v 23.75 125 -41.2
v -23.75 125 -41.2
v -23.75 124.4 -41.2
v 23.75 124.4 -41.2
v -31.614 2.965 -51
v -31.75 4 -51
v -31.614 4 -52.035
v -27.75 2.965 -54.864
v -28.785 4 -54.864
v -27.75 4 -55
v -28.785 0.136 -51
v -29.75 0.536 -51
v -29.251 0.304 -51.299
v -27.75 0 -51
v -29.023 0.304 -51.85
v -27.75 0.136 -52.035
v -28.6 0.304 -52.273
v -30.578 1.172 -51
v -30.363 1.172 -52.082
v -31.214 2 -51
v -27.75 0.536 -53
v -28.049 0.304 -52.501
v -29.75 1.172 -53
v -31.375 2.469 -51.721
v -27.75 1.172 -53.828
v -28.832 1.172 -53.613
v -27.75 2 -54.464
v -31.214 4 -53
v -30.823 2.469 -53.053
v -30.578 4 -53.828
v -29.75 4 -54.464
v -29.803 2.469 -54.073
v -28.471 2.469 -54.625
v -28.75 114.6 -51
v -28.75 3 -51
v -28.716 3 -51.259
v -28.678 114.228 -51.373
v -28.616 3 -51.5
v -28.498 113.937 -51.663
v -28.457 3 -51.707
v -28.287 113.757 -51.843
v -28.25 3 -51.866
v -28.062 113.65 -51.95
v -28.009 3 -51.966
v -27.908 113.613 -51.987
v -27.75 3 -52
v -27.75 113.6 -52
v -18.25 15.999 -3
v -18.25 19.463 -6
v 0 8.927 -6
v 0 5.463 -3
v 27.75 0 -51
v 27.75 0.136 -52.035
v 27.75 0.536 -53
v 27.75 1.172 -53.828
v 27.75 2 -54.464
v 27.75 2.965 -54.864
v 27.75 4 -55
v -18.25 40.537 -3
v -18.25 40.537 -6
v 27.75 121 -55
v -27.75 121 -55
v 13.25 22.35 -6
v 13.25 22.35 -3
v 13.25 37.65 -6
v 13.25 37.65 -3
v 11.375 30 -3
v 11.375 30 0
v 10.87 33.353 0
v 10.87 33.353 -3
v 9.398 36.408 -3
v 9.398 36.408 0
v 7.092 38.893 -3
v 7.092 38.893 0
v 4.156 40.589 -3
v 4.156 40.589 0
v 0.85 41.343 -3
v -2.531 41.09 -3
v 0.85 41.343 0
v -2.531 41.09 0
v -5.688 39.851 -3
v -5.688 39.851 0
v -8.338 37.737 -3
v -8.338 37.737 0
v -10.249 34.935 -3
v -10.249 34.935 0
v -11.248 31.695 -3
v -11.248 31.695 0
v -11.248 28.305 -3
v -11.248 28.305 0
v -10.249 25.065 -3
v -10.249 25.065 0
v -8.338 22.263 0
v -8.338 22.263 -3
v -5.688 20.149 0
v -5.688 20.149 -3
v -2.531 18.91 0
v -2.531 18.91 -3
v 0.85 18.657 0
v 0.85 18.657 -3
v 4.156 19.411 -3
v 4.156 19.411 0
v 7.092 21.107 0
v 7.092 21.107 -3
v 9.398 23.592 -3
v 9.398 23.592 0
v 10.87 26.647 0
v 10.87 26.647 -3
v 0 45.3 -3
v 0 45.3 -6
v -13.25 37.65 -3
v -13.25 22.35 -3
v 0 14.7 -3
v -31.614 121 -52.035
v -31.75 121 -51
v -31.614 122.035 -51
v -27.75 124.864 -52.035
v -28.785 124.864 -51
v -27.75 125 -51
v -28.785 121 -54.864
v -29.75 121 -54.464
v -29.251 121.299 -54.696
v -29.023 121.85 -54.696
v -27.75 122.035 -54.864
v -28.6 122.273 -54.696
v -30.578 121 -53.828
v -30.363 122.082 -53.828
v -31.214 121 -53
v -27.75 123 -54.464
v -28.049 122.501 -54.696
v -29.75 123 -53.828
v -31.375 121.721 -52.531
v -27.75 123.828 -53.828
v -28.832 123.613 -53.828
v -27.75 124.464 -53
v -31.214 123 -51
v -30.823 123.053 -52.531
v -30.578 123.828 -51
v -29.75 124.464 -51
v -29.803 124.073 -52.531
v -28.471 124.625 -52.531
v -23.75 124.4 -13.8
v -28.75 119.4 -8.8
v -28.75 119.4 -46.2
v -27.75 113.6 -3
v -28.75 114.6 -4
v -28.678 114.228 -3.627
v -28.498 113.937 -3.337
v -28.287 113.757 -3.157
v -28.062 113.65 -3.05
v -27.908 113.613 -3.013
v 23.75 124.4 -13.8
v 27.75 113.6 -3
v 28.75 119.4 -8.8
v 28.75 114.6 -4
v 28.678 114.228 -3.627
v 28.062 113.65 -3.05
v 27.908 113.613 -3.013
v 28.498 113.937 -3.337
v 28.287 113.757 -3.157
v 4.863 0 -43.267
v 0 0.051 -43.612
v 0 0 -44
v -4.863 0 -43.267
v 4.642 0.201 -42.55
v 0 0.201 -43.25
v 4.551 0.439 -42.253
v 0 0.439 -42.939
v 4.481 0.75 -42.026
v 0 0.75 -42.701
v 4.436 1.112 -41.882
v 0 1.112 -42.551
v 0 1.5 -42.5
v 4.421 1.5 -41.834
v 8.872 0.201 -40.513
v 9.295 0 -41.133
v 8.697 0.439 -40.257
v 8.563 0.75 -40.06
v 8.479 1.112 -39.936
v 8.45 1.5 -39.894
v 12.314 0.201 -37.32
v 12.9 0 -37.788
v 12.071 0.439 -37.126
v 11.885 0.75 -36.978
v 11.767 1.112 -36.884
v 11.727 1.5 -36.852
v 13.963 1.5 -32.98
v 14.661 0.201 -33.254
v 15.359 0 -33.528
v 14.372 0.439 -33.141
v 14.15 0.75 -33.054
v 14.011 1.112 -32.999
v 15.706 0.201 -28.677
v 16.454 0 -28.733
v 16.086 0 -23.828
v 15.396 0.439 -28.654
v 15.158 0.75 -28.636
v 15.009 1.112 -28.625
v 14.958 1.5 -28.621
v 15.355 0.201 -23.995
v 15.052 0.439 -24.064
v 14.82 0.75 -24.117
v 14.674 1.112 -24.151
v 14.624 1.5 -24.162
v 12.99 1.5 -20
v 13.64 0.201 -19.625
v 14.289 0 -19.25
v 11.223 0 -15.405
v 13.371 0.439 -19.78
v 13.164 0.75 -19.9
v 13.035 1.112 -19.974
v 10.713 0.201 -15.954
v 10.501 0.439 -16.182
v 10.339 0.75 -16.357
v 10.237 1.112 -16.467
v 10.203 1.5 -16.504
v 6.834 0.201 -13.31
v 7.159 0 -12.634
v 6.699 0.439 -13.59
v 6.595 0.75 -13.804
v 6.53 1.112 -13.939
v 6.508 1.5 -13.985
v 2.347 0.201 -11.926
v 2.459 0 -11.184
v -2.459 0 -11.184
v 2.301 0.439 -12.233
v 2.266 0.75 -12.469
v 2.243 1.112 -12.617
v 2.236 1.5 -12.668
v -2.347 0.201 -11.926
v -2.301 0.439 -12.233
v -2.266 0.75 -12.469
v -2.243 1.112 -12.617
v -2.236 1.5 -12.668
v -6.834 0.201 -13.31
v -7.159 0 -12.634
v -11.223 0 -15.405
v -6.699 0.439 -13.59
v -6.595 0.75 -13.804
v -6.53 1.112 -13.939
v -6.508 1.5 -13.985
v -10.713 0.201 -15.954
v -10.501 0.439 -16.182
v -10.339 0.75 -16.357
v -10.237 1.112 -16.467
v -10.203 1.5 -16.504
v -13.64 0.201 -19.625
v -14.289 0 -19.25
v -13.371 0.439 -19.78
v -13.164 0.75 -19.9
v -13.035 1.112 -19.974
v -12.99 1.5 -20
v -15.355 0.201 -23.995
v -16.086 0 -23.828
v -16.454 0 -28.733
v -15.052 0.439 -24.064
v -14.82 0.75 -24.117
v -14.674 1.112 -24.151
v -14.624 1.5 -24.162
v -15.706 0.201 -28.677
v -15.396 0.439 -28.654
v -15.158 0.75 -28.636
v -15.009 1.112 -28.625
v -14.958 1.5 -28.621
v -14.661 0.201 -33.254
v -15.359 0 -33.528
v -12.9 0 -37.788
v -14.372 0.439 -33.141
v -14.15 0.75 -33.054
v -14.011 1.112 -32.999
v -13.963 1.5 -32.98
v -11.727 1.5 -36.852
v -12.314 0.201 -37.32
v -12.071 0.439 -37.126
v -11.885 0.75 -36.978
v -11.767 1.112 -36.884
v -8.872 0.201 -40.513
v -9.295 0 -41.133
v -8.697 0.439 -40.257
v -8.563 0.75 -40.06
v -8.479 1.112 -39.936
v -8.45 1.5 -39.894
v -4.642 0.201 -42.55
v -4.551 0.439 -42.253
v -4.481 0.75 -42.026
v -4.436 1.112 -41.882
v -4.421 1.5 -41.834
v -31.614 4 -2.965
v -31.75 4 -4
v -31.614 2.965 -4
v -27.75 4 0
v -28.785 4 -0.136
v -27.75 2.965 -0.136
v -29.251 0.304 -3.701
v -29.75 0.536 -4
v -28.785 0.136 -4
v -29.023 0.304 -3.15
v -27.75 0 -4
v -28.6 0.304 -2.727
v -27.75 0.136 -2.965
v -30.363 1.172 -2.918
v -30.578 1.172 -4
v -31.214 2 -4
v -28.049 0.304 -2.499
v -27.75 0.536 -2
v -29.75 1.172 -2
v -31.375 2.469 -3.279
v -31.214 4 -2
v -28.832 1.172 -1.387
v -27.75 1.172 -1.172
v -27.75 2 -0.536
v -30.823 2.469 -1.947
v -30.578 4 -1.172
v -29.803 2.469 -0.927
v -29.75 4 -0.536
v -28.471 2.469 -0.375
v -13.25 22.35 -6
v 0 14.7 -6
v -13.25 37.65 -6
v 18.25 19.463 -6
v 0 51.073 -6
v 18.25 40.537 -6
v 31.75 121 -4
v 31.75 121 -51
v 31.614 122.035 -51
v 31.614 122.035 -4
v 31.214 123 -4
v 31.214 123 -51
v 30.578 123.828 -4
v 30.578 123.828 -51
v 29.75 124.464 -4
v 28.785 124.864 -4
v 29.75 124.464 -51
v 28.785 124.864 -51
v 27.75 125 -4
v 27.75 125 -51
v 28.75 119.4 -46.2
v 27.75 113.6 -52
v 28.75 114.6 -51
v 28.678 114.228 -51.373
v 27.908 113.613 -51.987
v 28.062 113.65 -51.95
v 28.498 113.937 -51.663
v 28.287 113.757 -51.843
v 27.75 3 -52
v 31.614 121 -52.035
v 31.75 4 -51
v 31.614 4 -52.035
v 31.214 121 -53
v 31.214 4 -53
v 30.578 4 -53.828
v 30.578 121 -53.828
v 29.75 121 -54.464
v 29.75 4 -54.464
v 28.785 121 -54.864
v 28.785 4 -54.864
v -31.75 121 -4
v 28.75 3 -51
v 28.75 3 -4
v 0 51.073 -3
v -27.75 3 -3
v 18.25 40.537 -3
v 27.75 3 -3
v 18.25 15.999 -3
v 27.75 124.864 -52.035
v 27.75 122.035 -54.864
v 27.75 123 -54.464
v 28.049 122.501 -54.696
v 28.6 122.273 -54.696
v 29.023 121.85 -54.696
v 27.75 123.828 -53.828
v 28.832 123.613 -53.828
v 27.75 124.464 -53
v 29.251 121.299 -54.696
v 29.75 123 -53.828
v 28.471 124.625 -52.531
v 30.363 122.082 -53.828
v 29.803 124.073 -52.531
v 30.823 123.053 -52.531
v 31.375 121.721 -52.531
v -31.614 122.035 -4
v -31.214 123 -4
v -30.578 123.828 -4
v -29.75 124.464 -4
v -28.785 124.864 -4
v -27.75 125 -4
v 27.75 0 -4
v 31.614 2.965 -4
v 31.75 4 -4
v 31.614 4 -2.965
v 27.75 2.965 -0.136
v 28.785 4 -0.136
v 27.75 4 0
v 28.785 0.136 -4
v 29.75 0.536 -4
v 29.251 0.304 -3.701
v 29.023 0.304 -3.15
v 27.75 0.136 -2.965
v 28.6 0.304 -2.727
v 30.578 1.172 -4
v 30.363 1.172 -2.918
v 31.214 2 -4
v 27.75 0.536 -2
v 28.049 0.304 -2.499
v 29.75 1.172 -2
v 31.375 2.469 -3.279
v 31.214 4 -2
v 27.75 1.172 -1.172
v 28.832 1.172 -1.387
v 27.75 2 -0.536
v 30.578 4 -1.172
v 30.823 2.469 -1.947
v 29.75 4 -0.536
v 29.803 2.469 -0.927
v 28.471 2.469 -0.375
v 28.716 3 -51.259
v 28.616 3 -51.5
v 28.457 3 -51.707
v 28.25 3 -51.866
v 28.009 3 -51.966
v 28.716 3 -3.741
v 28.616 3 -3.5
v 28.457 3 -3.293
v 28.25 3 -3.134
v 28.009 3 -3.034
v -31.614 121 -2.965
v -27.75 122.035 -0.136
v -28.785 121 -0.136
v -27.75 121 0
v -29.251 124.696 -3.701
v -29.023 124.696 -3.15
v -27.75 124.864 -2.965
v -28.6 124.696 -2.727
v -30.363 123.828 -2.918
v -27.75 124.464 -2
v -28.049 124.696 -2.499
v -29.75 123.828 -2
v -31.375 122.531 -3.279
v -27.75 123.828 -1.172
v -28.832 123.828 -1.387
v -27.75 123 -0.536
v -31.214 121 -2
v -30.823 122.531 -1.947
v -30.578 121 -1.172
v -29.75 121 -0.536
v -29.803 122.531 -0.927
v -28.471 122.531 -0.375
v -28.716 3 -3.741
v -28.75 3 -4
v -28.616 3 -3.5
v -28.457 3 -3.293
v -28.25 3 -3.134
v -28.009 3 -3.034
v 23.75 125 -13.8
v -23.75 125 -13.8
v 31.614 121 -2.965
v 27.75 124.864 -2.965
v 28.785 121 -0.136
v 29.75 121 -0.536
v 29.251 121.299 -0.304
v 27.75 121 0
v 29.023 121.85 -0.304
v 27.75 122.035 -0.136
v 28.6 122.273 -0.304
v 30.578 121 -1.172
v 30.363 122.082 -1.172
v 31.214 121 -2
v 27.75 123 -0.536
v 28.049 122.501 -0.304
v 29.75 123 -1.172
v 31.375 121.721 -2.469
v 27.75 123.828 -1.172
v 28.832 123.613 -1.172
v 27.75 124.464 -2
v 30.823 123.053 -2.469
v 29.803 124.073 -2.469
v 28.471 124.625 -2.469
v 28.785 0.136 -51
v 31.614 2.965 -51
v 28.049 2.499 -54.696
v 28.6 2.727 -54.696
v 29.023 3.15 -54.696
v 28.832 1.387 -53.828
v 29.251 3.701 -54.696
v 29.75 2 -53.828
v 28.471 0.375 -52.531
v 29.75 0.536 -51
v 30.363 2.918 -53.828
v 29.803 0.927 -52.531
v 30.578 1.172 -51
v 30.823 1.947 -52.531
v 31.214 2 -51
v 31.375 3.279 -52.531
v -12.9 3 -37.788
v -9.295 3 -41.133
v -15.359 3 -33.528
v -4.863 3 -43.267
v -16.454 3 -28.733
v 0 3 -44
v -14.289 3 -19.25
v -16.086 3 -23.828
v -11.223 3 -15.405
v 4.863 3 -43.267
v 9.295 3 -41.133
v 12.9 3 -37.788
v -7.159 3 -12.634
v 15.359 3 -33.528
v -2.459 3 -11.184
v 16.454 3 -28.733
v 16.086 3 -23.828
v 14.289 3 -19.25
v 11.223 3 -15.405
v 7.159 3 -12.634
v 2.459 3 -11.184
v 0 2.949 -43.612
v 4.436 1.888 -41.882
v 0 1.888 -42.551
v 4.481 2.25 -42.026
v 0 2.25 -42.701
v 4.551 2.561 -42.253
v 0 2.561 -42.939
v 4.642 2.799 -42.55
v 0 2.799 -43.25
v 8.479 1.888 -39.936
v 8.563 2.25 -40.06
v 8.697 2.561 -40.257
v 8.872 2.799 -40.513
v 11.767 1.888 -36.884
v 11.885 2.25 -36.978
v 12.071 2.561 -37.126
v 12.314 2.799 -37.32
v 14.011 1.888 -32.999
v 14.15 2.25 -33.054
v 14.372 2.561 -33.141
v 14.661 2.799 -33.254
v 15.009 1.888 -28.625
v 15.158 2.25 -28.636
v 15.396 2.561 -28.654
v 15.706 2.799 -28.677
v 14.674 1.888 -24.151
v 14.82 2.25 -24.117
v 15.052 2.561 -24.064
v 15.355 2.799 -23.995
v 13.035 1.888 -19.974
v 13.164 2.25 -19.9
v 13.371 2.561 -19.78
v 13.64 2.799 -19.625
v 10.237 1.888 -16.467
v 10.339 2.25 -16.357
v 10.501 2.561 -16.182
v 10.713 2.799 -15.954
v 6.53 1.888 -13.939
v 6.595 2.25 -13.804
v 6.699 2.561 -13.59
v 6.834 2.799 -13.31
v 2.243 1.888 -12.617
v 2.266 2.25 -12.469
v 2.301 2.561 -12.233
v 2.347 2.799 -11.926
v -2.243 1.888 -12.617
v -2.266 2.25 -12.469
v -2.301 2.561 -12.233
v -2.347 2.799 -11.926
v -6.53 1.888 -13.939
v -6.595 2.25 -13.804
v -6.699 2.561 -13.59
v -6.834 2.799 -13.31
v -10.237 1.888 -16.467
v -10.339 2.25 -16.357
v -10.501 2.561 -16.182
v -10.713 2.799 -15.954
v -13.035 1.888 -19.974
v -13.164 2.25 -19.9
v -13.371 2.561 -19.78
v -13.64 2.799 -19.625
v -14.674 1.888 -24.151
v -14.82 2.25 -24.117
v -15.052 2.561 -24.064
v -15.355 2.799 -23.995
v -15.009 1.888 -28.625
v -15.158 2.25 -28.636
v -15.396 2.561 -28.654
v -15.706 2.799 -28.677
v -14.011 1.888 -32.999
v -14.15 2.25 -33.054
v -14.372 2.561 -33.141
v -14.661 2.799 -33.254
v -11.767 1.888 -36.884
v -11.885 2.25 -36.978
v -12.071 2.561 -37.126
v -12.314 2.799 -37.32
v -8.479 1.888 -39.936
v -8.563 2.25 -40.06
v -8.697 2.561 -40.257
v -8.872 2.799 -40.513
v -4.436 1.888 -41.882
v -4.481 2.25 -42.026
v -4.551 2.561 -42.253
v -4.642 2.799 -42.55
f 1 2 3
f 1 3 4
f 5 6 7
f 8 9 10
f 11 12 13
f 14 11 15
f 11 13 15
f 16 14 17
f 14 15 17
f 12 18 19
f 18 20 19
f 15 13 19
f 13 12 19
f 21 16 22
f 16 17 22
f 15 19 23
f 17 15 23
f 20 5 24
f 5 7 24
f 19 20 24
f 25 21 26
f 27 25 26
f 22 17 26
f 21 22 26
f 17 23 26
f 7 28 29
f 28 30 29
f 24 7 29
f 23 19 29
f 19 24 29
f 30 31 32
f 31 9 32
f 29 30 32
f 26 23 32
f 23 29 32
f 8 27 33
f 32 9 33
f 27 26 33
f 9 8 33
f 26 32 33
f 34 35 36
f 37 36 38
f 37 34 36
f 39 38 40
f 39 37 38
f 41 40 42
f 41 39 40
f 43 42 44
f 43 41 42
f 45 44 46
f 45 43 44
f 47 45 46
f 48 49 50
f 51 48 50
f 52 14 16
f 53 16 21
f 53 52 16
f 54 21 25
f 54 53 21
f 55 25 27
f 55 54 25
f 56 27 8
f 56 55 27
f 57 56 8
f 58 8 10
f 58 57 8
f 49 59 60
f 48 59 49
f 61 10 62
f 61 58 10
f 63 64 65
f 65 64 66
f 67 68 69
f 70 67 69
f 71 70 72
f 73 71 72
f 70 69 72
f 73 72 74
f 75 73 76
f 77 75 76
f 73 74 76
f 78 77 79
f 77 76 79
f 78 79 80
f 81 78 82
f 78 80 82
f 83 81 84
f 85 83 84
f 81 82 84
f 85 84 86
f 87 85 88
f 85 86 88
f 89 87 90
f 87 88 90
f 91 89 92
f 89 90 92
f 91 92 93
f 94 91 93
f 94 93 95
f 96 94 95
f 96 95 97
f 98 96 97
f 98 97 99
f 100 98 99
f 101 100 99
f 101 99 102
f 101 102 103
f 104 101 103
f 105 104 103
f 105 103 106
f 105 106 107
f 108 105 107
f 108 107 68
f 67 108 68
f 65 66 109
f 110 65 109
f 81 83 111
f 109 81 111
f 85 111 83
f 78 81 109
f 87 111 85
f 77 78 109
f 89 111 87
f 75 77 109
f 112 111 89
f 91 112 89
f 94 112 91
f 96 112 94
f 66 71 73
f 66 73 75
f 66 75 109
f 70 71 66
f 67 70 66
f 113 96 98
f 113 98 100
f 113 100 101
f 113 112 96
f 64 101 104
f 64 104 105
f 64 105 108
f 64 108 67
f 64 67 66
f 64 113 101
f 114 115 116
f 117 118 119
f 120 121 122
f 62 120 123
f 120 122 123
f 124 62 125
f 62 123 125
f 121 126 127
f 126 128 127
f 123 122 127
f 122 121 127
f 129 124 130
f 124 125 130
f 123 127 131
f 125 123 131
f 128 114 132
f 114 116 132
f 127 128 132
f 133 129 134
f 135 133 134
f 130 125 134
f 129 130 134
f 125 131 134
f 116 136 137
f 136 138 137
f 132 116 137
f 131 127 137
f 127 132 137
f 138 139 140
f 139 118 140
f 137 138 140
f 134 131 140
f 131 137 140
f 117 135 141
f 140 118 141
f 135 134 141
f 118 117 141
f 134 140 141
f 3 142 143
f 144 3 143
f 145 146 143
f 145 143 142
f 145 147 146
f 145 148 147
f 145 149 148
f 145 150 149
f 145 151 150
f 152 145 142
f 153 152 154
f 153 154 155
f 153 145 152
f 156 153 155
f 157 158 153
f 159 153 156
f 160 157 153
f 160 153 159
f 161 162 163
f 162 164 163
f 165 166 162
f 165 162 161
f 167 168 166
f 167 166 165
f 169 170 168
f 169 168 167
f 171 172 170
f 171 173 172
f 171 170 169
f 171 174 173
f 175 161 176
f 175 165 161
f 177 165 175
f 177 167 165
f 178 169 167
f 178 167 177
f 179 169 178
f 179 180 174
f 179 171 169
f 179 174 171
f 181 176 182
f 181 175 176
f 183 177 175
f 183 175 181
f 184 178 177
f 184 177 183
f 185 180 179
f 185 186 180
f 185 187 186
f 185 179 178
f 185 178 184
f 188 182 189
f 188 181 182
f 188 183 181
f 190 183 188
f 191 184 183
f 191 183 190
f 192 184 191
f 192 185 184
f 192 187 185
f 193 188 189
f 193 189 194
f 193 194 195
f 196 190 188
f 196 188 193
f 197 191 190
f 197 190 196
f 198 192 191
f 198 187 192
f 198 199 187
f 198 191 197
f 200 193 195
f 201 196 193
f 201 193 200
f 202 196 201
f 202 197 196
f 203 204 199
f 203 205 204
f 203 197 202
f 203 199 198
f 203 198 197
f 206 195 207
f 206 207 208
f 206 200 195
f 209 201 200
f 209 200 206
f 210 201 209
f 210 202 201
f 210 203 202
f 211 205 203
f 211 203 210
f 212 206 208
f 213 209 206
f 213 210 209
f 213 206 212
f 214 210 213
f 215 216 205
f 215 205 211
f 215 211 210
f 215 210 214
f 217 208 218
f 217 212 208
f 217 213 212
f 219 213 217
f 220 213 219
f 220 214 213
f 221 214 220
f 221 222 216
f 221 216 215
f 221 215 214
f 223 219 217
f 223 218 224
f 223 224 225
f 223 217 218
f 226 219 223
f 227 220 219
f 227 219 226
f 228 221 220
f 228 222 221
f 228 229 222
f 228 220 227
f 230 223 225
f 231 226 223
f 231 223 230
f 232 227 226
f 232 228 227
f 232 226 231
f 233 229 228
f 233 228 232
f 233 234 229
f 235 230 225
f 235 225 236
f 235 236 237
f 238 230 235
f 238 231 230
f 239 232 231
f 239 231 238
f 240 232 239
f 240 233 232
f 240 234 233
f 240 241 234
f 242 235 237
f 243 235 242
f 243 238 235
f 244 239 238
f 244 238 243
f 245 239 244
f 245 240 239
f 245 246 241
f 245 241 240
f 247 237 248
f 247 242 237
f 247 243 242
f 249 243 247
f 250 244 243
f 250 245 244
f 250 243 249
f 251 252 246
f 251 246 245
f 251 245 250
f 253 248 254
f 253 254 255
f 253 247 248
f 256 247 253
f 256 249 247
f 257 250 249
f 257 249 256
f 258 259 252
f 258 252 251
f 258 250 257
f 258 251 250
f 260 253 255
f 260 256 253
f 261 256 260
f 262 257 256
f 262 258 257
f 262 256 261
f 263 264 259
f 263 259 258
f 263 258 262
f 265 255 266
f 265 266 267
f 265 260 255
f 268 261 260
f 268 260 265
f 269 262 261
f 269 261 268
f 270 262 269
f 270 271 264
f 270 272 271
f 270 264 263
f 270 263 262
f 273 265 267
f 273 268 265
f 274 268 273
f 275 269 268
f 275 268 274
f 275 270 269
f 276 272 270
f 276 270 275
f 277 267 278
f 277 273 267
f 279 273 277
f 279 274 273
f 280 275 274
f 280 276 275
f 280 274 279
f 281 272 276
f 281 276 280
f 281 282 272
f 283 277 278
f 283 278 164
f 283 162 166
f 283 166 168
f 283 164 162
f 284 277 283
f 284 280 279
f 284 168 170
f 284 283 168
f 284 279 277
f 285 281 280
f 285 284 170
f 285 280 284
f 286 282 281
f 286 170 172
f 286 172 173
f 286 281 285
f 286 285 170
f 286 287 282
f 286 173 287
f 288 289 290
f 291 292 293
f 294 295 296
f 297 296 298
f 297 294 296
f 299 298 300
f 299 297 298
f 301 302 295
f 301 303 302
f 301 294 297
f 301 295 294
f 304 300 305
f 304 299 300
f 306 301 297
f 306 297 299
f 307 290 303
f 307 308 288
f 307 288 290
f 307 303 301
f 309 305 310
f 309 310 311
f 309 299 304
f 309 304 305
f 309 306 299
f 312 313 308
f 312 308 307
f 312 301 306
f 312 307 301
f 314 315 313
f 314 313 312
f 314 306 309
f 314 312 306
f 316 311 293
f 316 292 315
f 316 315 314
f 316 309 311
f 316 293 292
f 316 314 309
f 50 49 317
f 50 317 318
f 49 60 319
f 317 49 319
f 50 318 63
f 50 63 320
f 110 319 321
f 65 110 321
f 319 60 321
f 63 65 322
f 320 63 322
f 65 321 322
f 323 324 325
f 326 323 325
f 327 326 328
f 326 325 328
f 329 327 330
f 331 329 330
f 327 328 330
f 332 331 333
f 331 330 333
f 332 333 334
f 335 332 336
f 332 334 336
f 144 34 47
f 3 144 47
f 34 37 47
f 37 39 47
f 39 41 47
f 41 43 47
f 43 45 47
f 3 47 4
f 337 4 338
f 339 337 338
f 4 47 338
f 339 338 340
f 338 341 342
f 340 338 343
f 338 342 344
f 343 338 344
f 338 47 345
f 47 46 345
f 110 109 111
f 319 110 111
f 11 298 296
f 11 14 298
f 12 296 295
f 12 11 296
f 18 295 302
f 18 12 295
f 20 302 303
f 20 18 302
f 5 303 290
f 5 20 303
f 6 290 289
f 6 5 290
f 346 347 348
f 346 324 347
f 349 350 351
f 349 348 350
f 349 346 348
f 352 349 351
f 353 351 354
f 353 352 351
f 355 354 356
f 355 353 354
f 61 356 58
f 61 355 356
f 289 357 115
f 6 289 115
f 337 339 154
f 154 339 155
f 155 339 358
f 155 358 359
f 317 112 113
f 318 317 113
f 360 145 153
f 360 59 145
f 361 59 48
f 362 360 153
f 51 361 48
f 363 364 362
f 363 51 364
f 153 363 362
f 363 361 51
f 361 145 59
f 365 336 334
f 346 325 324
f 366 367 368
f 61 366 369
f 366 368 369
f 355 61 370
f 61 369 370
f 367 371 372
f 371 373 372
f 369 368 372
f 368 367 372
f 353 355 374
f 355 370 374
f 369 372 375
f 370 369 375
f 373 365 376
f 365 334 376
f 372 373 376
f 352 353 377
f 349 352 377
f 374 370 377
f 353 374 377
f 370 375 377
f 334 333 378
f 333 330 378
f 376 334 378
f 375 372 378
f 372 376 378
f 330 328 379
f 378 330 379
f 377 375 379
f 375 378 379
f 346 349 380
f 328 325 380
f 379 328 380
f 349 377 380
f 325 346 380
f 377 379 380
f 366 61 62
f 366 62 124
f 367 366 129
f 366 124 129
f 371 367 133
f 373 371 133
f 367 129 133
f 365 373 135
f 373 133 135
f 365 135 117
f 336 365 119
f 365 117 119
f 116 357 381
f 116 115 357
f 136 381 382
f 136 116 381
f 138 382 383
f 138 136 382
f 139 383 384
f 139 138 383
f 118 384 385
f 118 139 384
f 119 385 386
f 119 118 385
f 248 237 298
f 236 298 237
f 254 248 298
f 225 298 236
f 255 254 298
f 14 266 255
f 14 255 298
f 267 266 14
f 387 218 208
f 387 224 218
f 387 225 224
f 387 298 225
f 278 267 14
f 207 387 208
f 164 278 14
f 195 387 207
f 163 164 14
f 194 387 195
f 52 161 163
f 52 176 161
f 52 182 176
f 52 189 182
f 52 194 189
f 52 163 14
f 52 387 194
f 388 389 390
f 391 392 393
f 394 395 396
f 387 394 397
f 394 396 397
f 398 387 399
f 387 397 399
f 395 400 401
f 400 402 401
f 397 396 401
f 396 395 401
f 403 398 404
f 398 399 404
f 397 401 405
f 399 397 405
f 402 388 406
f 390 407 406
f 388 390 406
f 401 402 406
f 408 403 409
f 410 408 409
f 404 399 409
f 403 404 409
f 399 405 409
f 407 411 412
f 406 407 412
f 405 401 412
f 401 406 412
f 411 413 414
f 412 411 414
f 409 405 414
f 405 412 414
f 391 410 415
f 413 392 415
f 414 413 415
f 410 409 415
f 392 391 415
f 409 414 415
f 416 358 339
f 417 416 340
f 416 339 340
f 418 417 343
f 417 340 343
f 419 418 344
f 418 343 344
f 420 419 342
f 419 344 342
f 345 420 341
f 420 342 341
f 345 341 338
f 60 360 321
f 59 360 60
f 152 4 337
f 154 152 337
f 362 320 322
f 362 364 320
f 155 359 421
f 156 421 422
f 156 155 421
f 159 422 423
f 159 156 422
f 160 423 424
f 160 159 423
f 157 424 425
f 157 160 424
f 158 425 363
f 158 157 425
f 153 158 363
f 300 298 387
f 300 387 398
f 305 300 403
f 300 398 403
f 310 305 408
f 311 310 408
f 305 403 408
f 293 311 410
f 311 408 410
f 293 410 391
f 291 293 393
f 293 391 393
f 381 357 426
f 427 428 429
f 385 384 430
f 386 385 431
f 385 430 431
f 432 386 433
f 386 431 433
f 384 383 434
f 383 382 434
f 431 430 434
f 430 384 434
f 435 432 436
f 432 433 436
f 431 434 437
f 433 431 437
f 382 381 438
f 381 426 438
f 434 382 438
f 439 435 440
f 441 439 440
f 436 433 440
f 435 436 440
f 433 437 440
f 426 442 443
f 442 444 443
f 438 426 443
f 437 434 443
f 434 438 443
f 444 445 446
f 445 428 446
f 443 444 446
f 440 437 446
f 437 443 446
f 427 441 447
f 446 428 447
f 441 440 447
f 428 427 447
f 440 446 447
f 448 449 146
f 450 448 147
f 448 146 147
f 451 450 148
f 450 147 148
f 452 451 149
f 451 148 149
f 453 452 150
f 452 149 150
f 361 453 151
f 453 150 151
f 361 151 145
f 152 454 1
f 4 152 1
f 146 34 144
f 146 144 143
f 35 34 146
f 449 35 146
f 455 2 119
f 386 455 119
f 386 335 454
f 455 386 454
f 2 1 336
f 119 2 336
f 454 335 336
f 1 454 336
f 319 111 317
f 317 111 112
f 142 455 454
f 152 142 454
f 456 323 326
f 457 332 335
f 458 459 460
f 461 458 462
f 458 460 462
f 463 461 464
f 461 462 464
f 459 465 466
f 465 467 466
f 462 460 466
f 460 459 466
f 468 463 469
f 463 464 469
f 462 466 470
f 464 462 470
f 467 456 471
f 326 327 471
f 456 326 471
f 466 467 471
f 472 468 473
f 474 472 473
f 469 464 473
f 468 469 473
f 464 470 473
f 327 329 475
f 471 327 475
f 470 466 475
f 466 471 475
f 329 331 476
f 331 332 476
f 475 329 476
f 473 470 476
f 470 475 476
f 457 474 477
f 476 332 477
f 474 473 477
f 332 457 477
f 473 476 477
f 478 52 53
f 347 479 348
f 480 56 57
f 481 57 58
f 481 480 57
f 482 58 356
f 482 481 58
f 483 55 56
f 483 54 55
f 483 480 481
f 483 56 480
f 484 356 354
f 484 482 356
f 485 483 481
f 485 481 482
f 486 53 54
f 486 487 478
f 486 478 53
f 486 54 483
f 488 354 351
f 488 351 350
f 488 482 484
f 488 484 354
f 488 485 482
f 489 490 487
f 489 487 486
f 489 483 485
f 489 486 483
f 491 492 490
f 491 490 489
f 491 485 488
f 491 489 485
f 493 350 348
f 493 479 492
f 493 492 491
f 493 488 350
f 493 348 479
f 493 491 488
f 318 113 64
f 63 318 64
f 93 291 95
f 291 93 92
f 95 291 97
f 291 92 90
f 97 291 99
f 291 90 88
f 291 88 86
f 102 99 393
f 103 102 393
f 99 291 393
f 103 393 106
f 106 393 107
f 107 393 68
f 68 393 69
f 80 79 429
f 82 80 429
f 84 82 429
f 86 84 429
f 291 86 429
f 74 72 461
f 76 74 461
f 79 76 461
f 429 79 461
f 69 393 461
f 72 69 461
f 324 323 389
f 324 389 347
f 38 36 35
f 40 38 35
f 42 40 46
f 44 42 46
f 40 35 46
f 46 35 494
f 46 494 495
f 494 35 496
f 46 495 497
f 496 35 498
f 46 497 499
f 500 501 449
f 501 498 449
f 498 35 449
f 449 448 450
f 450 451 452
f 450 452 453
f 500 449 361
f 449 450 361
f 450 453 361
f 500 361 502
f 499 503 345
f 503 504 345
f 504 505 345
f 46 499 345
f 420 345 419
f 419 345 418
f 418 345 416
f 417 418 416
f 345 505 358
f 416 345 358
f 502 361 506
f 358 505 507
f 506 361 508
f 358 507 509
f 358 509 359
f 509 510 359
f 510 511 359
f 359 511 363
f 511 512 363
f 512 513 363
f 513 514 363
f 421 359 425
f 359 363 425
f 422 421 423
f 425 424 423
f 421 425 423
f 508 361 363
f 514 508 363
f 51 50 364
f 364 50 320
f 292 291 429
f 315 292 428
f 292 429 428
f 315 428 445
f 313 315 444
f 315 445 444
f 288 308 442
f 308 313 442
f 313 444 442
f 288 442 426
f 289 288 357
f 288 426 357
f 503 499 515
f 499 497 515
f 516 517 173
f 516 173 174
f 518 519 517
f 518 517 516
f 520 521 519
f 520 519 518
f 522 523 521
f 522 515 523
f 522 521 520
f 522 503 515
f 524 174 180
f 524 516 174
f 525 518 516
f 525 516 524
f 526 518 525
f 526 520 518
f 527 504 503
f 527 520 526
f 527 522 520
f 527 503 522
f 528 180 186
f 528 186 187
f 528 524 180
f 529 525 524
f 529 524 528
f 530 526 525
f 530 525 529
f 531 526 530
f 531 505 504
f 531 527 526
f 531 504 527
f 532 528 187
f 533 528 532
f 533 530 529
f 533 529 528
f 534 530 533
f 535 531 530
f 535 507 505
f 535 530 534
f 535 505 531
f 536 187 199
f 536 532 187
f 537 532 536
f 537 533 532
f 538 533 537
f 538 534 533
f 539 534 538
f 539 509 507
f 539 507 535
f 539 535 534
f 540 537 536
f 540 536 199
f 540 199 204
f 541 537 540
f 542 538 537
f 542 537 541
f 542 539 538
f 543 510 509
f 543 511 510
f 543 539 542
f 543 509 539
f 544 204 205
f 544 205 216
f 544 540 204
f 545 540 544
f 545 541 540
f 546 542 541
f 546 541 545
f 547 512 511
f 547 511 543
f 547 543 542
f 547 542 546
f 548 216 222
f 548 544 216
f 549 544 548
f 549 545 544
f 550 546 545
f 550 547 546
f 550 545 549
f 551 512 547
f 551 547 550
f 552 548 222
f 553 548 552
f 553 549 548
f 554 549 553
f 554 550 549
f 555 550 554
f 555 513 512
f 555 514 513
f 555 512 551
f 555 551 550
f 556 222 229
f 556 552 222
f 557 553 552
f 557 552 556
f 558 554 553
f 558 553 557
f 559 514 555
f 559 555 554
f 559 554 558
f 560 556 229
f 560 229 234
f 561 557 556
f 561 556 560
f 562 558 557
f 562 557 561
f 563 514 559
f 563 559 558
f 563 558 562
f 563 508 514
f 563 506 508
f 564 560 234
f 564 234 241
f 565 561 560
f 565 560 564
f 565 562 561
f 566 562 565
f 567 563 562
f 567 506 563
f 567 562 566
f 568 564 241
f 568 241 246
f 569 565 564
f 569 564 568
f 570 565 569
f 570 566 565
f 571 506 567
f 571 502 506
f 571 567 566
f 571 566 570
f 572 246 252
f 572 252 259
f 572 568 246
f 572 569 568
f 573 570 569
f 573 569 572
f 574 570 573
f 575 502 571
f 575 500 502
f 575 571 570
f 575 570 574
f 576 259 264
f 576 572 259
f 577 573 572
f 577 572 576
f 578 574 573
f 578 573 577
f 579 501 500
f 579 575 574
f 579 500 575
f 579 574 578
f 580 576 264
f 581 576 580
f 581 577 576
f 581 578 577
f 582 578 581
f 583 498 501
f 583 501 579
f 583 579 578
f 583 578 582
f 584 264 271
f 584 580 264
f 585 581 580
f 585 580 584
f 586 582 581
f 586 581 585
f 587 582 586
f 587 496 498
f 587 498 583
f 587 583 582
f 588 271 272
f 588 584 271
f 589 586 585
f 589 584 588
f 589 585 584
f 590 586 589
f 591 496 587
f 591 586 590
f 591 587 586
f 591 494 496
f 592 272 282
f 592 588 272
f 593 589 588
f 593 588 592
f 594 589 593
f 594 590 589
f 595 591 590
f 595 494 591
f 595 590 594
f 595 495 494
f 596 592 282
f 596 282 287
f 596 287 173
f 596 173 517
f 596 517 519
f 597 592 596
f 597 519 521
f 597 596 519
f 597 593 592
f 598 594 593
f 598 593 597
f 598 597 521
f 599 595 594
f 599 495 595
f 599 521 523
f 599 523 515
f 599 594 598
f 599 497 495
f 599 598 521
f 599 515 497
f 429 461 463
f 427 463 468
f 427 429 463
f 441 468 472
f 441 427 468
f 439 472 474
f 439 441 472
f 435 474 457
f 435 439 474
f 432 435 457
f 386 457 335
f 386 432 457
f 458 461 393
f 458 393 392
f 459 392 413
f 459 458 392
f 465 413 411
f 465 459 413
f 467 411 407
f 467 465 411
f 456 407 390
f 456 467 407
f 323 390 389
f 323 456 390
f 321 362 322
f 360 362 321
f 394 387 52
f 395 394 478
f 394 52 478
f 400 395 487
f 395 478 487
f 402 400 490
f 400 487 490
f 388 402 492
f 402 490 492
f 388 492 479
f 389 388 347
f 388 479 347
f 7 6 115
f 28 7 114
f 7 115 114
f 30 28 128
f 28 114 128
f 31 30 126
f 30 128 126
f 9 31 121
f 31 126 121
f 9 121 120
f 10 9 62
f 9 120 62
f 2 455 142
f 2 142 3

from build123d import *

# Parameters (mm, degrees)
PROFILE_SKETCH_W                         = 55
PROFILE_SKETCH_H                         = 125
PROFILE_EXTRUDE_DEPTH                    = 31.75
INTERIOR_START                           = -3
INTERIOR_SKETCH_W                        = 57.5
INTERIOR_SKETCH_H                        = 49
INTERIOR_CUT_DEPTH                       = 121.4
POWER_SWITCH_OPENING_CUT_REACH           = 142.207
OPENING_SKETCH_W                         = 47.5
OPENING_SKETCH_H                         = 27.4
INSIDE_TOP_CHAMFER_1_SIZE                = 5
INSIDE_TOP_CHAMFER_2_SIZE                = 10.8
STOP_BUTTON_HOLE_CUT_REACH               = 142.207
STOP_BUTTON_HOLE_SKETCH_R                = 11.375
NUT_START                                = -3
NUT_RECESS_EXTRUDE_DEPTH                 = 3
INSIDE_FILLETS_R                         = 1
WIRE_OUTLET_CUT_REACH                    = 142.207
WIRE_OUTLET_CUT_SKETCH_R                 = 15
NUT_RECESS_CHAMFER_FOR_PRINTABILITY_SIZE = 3
WIRE_OUTLET_FILLET_R                     = 1.5
TOP_FILLETS_R                            = 4


# Some blends are built 0.0001 mm under size
with BuildPart() as part:
    # Profile Sketch → Profile Extrude (new, symmetric)
    with BuildSketch(Plane(origin=(0, 0, 0), x_dir=(0, 0, -1), z_dir=(1, 0, 0))):
        with Locations((27.5, 62.5)):
            Rectangle(PROFILE_SKETCH_W, PROFILE_SKETCH_H)
    extrude(amount=PROFILE_EXTRUDE_DEPTH, both=True)

    # Interior Sketch → Interior Cut (cut)
    with BuildSketch(Plane.XZ.offset(INTERIOR_START)):
        with Locations((0, -27.5)):
            Rectangle(INTERIOR_SKETCH_W, INTERIOR_SKETCH_H)
    extrude(amount=-INTERIOR_CUT_DEPTH, mode=Mode.SUBTRACT)

    # Opening Sketch → Power Switch Opening Cut (cut, up to next)
    with BuildSketch(Plane(origin=(0, 125, 0), x_dir=(1, 0, 0), z_dir=(0, 1, 0)), mode=Mode.PRIVATE) as power_switch_opening_cut_sk1:
        with Locations((0, 27.5)):
            Rectangle(OPENING_SKETCH_W, OPENING_SKETCH_H)
    power_switch_opening_cut_tool1 = extrude(power_switch_opening_cut_sk1.sketch, amount=-POWER_SWITCH_OPENING_CUT_REACH, mode=Mode.PRIVATE) & part.part
    add(power_switch_opening_cut_tool1.solids().sort_by_distance((0, 125, -27.5))[0], mode=Mode.SUBTRACT)

    # Inside Top Chamfer 1
    # the kernel refuses this chamfer: 5 mm, written as the material it adds along each edge
    with BuildSketch(Plane(origin=(28.75, 124.4, -52), x_dir=(-0.9996219169112968, 0.0274958766105877, 0), z_dir=(0, 0, 1)), Plane(origin=(-28.75, 124.4, -3), x_dir=(0.9996219169112968, 0.0274958766105877, 0), z_dir=(0, 0, -1))) as inside_top_chamfer_1_piece_1:
        Polygon((INSIDE_TOP_CHAMFER_1_SIZE * 0.999621916911, INSIDE_TOP_CHAMFER_1_SIZE * 0.0274958766106), (-INSIDE_TOP_CHAMFER_1_SIZE * 0.0274958766106, INSIDE_TOP_CHAMFER_1_SIZE * 0.999621916911), (0, 0), align=None)
    extrude(amount=49)

    # Inside Top Chamfer 2
    inside_top_chamfer_2_edges = [part.edges().sort_by_distance(p)[0] for p in [
        (0, 124.4, -52),
        (0, 124.4, -3),
    ]]
    chamfer(inside_top_chamfer_2_edges, length=INSIDE_TOP_CHAMFER_2_SIZE - 0.0001)  # a hair under: the kernel refuses the full size

    # Stop Button Hole Sketch → Stop Button Hole Cut (cut, up to next)
    with BuildSketch(Plane.XY, mode=Mode.PRIVATE) as stop_button_hole_cut_sk1:
        with Locations((0, 30)):
            Circle(STOP_BUTTON_HOLE_SKETCH_R)
    stop_button_hole_cut_tool1 = extrude(stop_button_hole_cut_sk1.sketch, amount=-STOP_BUTTON_HOLE_CUT_REACH, mode=Mode.PRIVATE) & part.part
    add(stop_button_hole_cut_tool1.solids().sort_by_distance((0, 30, 0))[0], mode=Mode.SUBTRACT)

    # Stop Button Nut Sketch → Nut Recess Extrude (add)
    with BuildSketch(Plane.XY.offset(NUT_START)):
        Polygon((0, 8.926715175), (18.25, 19.463357587), (18.25, 40.536642413), (0, 51.073284825), (-18.25, 40.536642413), (-18.25, 19.463357587), align=None)
        Polygon((-13.25, 22.350108933), (0, 14.700217866), (13.25, 22.350108933), (13.25, 37.649891067), (0, 45.299782134), (-13.25, 37.649891067), align=None, mode=Mode.SUBTRACT)
    extrude(amount=-NUT_RECESS_EXTRUDE_DEPTH)

    # Inside Fillets
    inside_fillets_edges = [part.edges().sort_by_distance(p)[0] for p in [
        (28.75, 58.30005, -52),
        (-28.75, 58.30005, -52),
        (-28.75, 58.30005, -3),
        (28.75, 58.30005, -3),
    ]]
    fillet(inside_fillets_edges, radius=INSIDE_FILLETS_R)

    # Wire Outlet Cut Sketch → Wire Outlet Cut (cut, up to next)
    with BuildSketch(Plane.XZ, mode=Mode.PRIVATE) as wire_outlet_cut_sk1:
        with Locations(Location((0, -27.5, 0), (0, 0, 270))):
            Circle(WIRE_OUTLET_CUT_SKETCH_R)
    wire_outlet_cut_tool1 = extrude(wire_outlet_cut_sk1.sketch, amount=-WIRE_OUTLET_CUT_REACH, mode=Mode.PRIVATE) & part.part
    add(wire_outlet_cut_tool1.solids().sort_by_distance((0, 0, -27.5))[0], mode=Mode.SUBTRACT)

    # Nut Recess Chamfer for Printability
    nut_recess_chamfer_for_printability_edges = [part.edges().sort_by_distance(p)[0] for p in [
        (9.125, 14.195036381, -3),
        (-9.125, 14.195036381, -3),
    ]]
    chamfer(nut_recess_chamfer_for_printability_edges, length=NUT_RECESS_CHAMFER_FOR_PRINTABILITY_SIZE - 0.0001)  # a hair under: the kernel refuses the full size

    # Wire Outlet Fillet
    wire_outlet_fillet_edges = [part.edges().sort_by_distance(p)[0] for p in [
        (0, 0, -12.5),
        (0, 3, -12.5),
    ]]
    fillet(wire_outlet_fillet_edges, radius=WIRE_OUTLET_FILLET_R - 0.0001)  # a hair under: the kernel refuses the full size

    # Top Fillets
    top_fillets_edges = [part.edges().sort_by_distance(p)[0] for p in [
        (31.75, 125, -27.5),
        (31.75, 62.5, 0),
        (31.75, 0, -27.5),
        (-31.75, 62.5, 0),
        (-31.75, 125, -27.5),
        (-31.75, 62.5, -55),
        (-31.75, 0, -27.5),
        (0, 0, 0),
        (0, 125, 0),
        (0, 125, -55),
        (0, 0, -55),
        (31.75, 62.5, -55),
    ]]
    fillet(top_fillets_edges, radius=TOP_FILLETS_R)


solid = part.part
